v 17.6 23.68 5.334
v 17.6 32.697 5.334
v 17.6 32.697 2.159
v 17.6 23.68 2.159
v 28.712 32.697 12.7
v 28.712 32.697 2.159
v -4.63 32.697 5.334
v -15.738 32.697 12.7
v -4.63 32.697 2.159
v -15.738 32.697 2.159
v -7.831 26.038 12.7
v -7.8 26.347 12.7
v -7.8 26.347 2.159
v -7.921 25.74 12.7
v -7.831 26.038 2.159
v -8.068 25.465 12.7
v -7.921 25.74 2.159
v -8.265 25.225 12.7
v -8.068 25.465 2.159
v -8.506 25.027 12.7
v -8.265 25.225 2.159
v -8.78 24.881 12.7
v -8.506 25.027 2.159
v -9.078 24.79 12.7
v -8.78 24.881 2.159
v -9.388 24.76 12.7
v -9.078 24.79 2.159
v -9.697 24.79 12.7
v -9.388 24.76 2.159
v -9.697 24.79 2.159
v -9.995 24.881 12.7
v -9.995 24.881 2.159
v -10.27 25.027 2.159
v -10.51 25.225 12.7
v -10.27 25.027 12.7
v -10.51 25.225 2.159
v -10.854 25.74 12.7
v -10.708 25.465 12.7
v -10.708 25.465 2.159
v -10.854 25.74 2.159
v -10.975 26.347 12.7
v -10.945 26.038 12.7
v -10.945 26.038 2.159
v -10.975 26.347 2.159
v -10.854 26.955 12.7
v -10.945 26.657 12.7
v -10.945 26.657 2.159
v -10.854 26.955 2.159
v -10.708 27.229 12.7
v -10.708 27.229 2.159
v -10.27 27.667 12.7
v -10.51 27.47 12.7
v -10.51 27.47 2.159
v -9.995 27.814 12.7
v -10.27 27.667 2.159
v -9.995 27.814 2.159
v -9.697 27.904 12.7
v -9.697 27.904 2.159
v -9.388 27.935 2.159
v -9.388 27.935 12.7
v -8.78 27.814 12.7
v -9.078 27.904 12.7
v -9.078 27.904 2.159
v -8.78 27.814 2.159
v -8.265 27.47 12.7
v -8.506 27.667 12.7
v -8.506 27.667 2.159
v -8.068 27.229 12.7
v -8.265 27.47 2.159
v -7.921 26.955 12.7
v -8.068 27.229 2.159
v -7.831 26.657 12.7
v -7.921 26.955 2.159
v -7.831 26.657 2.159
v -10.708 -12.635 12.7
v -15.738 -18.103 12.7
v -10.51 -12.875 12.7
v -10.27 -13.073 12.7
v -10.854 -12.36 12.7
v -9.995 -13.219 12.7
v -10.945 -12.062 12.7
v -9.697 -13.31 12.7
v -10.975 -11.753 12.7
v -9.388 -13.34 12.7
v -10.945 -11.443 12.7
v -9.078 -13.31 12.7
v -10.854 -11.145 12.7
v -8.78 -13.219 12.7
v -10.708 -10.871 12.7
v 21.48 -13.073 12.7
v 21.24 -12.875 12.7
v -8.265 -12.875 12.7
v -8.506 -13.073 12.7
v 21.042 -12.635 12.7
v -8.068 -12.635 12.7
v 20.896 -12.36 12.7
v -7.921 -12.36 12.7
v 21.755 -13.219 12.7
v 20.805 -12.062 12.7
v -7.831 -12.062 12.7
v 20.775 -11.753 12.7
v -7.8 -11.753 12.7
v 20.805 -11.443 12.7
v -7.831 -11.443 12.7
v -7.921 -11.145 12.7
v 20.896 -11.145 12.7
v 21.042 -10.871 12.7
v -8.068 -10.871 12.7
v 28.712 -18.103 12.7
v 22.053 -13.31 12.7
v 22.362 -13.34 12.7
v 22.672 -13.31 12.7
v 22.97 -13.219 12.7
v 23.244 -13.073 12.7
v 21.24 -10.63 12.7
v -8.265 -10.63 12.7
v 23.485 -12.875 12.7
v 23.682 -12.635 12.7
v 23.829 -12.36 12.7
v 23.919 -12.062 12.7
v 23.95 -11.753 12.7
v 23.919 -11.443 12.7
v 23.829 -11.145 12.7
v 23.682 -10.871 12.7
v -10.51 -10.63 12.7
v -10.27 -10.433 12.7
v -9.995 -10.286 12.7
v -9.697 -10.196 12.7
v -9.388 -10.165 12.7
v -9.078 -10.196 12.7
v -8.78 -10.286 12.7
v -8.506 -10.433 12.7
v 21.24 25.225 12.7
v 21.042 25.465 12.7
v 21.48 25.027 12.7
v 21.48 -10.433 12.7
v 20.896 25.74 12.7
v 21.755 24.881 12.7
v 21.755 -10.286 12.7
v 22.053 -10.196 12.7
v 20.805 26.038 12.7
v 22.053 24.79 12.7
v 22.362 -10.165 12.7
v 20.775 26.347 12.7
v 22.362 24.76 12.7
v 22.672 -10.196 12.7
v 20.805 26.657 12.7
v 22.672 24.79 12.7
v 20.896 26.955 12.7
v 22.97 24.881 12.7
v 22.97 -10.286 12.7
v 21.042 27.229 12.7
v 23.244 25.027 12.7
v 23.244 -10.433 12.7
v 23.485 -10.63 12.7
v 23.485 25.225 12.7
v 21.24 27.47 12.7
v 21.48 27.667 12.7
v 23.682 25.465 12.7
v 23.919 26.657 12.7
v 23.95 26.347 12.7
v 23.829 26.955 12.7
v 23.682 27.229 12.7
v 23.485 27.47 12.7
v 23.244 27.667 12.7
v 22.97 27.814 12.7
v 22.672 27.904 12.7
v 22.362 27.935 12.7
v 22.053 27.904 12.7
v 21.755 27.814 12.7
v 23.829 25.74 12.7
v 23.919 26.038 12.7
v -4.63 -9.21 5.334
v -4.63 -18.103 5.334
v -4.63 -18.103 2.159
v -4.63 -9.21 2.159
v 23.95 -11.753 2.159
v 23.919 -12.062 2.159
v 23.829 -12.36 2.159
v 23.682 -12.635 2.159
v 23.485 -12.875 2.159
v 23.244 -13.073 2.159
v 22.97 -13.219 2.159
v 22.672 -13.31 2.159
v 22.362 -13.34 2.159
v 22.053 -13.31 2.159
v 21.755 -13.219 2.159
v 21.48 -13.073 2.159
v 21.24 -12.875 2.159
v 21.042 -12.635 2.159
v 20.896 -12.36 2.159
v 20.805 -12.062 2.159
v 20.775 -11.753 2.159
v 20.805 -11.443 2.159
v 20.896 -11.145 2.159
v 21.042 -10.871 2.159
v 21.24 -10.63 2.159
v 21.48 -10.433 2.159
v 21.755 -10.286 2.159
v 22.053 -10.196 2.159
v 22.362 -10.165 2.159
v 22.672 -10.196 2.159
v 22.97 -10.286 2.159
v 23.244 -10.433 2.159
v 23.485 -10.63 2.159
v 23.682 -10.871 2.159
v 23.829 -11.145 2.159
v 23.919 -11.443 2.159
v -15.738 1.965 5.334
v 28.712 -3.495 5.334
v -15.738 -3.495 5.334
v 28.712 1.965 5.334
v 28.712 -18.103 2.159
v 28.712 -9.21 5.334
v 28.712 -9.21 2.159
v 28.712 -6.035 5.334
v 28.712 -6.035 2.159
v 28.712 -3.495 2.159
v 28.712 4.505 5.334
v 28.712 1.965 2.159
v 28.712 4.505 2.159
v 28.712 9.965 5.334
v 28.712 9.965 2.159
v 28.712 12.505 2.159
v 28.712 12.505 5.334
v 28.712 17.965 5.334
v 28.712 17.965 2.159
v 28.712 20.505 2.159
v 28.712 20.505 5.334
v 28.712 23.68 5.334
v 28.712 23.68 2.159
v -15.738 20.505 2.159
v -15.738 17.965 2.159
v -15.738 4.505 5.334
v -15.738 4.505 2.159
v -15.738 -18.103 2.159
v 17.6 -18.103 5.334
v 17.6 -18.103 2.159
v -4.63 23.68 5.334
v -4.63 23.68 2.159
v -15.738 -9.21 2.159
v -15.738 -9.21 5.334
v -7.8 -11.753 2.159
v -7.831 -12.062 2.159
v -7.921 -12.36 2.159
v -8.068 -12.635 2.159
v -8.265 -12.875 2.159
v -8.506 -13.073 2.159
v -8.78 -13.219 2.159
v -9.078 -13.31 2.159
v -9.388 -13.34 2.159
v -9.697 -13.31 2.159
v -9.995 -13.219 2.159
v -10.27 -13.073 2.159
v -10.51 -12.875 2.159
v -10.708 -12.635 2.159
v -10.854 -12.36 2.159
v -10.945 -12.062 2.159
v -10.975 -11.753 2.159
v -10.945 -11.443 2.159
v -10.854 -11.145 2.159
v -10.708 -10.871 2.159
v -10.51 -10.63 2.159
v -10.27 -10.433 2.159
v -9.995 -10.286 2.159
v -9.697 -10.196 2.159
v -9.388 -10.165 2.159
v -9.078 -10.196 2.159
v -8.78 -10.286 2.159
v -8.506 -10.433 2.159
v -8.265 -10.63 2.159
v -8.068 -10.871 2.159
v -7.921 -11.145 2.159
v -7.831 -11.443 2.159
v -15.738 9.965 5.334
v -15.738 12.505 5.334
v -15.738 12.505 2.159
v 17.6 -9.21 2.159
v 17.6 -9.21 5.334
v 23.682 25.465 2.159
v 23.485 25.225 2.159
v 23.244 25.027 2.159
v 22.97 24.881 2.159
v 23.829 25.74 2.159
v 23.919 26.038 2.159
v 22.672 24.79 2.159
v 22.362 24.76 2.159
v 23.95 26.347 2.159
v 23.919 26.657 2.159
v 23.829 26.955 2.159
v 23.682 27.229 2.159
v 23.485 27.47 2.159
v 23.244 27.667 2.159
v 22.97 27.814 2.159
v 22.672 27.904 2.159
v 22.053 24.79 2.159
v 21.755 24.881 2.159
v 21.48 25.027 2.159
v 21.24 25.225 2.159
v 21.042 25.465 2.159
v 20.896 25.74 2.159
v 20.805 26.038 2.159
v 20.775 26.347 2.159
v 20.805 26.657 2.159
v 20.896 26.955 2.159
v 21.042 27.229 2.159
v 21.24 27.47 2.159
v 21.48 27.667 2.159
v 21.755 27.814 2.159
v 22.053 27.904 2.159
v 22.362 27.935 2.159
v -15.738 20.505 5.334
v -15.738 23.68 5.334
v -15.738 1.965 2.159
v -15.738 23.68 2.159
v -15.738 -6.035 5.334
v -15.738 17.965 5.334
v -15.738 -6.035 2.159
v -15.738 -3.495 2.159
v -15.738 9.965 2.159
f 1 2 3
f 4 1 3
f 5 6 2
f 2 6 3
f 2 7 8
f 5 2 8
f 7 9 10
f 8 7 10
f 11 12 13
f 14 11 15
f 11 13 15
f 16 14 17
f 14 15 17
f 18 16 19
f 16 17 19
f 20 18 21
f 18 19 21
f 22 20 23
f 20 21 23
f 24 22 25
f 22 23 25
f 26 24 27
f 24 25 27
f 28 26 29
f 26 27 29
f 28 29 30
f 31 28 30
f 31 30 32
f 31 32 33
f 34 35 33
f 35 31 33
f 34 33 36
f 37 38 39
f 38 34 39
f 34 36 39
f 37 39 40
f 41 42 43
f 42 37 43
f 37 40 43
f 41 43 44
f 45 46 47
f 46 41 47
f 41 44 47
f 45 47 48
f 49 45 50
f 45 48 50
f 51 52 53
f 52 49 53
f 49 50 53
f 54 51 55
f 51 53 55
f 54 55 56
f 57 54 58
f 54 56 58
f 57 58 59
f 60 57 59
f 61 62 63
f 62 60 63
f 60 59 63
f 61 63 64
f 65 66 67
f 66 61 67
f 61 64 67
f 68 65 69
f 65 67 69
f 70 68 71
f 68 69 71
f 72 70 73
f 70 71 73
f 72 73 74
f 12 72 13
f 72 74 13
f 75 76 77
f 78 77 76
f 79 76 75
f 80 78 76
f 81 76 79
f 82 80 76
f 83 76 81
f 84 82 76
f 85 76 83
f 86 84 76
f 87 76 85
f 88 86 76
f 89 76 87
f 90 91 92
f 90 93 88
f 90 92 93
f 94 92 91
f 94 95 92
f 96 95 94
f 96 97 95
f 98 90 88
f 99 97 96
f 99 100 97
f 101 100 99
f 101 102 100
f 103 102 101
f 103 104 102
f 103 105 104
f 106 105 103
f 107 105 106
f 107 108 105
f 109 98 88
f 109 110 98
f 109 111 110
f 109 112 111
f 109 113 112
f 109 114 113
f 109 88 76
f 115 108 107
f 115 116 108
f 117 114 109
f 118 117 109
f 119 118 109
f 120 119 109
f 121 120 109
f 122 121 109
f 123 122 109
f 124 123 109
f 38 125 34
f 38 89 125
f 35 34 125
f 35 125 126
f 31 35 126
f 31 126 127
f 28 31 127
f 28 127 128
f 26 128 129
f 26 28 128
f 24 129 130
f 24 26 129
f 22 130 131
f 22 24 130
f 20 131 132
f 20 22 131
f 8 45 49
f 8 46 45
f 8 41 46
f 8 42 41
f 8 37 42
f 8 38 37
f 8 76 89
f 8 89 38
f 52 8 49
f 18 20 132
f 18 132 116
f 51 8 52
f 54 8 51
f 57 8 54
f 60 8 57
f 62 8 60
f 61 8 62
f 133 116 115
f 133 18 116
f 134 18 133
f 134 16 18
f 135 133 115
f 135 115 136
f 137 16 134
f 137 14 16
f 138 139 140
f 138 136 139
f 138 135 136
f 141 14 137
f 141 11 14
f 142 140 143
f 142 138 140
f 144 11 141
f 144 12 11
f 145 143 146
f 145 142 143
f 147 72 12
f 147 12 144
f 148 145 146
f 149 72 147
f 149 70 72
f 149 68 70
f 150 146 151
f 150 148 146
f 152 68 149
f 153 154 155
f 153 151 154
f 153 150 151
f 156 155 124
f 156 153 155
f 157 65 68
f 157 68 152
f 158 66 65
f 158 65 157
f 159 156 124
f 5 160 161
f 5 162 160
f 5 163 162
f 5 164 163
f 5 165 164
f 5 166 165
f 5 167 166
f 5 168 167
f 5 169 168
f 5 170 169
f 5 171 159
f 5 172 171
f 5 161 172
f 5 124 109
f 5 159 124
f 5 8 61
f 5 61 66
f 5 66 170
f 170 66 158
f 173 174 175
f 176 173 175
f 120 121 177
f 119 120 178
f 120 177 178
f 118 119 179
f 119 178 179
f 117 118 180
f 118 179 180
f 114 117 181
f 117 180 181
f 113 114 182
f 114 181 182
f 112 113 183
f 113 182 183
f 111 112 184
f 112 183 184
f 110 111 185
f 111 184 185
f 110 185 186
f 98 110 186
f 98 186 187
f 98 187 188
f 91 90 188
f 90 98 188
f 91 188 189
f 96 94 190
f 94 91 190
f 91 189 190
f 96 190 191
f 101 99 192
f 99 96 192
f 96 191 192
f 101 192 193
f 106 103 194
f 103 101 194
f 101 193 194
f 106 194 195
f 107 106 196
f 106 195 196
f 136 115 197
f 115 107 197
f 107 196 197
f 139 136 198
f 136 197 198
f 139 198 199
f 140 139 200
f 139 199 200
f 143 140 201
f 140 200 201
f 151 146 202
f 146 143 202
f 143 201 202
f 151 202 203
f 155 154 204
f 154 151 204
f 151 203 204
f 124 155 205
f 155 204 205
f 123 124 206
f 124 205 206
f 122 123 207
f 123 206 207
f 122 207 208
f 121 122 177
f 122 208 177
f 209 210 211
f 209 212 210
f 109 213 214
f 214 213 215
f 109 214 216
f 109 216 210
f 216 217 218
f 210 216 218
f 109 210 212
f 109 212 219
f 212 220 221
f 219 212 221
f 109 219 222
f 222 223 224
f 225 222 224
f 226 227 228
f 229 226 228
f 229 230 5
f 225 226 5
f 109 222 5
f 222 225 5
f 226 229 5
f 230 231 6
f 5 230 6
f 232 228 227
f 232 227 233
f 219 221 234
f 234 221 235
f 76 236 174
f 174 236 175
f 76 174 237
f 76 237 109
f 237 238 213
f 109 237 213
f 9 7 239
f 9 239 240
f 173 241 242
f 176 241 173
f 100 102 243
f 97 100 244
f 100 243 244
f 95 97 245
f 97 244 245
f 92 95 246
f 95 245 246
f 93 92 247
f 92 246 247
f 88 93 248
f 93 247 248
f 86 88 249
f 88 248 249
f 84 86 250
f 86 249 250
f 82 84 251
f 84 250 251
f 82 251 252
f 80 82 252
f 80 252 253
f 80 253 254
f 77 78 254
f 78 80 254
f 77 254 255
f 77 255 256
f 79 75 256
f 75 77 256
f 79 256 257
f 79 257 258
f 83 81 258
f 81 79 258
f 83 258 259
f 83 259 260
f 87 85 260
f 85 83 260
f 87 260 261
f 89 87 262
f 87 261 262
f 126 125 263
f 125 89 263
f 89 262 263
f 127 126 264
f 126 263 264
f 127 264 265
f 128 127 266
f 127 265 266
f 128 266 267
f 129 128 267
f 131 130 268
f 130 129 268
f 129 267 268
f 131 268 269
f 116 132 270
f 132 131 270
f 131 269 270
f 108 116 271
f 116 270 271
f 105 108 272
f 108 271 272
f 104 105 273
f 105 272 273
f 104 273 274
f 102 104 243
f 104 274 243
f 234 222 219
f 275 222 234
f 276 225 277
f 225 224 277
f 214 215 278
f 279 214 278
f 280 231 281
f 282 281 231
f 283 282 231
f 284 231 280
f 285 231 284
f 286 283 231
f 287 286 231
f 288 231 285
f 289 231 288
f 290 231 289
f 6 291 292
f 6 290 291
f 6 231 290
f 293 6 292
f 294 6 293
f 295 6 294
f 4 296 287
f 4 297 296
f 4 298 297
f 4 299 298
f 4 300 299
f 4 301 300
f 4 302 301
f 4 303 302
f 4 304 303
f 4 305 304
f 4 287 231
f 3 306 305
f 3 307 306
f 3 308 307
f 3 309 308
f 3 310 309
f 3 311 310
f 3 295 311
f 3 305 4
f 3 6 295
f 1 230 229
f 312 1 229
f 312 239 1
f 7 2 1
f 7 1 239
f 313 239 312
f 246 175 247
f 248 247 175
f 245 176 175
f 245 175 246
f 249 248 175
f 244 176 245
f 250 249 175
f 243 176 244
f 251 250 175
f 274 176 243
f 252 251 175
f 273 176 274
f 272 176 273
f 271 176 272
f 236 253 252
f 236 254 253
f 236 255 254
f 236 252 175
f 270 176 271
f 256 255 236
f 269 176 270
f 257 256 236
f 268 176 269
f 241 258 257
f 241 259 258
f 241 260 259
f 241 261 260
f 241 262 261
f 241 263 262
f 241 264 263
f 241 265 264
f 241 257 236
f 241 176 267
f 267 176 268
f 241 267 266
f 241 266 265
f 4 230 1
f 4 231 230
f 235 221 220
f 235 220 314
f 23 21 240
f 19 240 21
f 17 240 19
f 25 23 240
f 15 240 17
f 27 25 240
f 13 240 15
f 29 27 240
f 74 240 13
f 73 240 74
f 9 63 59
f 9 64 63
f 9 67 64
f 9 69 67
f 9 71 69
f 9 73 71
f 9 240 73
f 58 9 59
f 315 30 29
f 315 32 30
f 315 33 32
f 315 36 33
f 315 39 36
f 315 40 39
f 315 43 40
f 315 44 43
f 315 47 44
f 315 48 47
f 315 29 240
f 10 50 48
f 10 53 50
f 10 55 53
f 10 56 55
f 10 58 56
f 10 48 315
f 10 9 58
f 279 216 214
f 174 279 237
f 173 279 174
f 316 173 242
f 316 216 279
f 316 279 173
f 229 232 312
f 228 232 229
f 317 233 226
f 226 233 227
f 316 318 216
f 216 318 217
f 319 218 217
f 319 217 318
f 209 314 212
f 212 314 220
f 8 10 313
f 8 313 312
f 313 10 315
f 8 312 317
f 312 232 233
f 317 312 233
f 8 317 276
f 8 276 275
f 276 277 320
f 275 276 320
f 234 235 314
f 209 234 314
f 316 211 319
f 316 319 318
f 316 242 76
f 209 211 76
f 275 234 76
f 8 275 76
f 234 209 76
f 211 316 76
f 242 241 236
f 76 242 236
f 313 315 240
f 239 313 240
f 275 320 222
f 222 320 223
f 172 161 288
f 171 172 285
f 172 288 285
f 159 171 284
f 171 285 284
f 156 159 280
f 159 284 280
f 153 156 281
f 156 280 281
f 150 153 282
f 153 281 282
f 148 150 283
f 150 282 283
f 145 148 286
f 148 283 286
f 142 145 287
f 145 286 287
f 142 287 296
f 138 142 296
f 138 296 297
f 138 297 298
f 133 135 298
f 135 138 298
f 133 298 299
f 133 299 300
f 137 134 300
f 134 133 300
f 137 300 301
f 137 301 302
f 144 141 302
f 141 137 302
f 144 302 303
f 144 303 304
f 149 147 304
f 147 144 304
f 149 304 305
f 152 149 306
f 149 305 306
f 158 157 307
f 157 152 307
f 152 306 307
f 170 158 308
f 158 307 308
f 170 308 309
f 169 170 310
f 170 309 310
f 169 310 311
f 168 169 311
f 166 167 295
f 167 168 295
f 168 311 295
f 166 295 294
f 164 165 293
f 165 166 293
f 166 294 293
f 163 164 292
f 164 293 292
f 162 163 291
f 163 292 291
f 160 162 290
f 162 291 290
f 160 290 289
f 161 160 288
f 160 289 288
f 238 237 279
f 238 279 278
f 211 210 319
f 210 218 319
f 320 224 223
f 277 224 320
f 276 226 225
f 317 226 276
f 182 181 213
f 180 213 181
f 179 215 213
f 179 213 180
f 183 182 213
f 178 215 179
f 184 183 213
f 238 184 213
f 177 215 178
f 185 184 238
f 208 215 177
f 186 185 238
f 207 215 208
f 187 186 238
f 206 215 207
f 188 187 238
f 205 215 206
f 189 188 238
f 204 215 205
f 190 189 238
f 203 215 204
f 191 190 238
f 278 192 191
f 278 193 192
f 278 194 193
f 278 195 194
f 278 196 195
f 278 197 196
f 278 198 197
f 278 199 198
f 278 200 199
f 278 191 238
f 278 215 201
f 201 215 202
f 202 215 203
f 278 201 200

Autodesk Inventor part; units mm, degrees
ref_plane "YZ Plane" through (0, 0, 0) normal (1, 0, 0) x (0, 1, 0)
ref_plane "XZ Plane" through (0, 0, 0) normal (0, 1, 0) x (-1, 0, 0)
sketch "Sketch1" plane through (0, 0, 0) normal (0, 0, 1) x (1, 0, 0)
  circle A0 centre (22.3624, 26.3473) radius 1.5875
  circle A1 centre (22.3624, -11.7527) radius 1.5875
  circle A2 centre (-9.3876, 26.3473) radius 1.5875
  circle A3 centre (-9.3876, -11.7527) radius 1.5875
  line L0 (28.7124, 32.6973) -> (-15.7376, 32.6973)
  line L1 (-15.7376, 32.6973) -> (-15.7376, -18.1027)
  line L2 (-15.7376, -18.1027) -> (28.7124, -18.1027)
  line L3 (28.7124, -18.1027) -> (28.7124, 32.6973)
  point P0 (-3.5123, 7.2973)
  dimension "d26" = 50.8
  dimension "d27" = 44.45
  dimension "d28" = 6.35
  dimension "d29" = 6.35
  dimension "d30" = 6.35
  dimension "d31" = 6.35
  dimension "d32" = 6.35
  dimension "d33" = 6.35
  dimension "d34" = 6.35
  dimension "d35" = 6.35
  dimension "d44" = 3.175
  dimension "d45" = 3.175
  dimension "d46" = 3.175
  dimension "d47" = 3.175
extrude "Extrusion1" add sketch "Sketch1" along normal blind 12.7
sketch "Sketch2" plane through (-15.7376, -18.1027, 0) normal (0, -1, 0) x (1, 0, 0)
  line L0 (11.1075, 69.4178) -> (11.1075, 0)
  line L1 (33.3375, 69.1638) -> (33.3375, 0)
  line L2 (11.1075, 0) -> (33.3375, 0)
  line L3 (0, 9.525) -> (44.45, 9.525)
  line L4 (11.1075, 0) -> (33.3375, 0)
  line L5 (33.3375, 0) -> (33.3375, 5.334)
  line L6 (33.3375, 5.334) -> (11.1075, 5.334)
  line L7 (11.1075, 5.334) -> (11.1075, 0)
  line L8 (0, 0) -> (44.45, 0) projected
  point P0 (15.875, 0)
  point P1 (11.1075, 5.334)
  dimension "d2" = 5.334
  dimension "d21" = 0
extrude "Extrusion2" cut sketch "Sketch2" against normal blind 76.2 contours L6 L1 L2 L0
ref_plane "Work Plane1" through (-16.0653, -32.8267, -33.655) normal (0, 0, -1) x (0, 1, 0)
sketch "Sketch3" plane through (17.5999, -18.1027, 5.334) normal (0, 0, -1) x (-1, 0, 0)
  line L0 (0, 0) -> (0, 50.8) projected
  line L1 (0, 36.068) -> (22.23, 36.068)
  line L2 (22.23, 36.068) -> (22.23, 38.608)
  line L3 (22.23, 38.608) -> (0, 38.608)
  line L4 (0, 38.608) -> (0, 36.068)
  line L5 (0, 50.8) -> (22.23, 50.8) projected
  line L6 (33.3375, 65.3946) -> (33.3375, 0) projected
  line L7 (0, 28.068) -> (22.23, 28.068)
  line L8 (22.23, 28.068) -> (22.23, 30.608)
  line L9 (22.23, 30.608) -> (0, 30.608)
  line L10 (0, 30.608) -> (0, 28.068)
  line L11 (0, 20.068) -> (22.23, 20.068)
  line L12 (22.23, 20.068) -> (22.23, 22.608)
  line L13 (22.23, 22.608) -> (0, 22.608)
  line L14 (0, 22.608) -> (0, 20.068)
  line L15 (0, 12.068) -> (22.23, 12.068)
  line L16 (22.23, 12.068) -> (22.23, 14.608)
  line L17 (22.23, 14.608) -> (0, 14.608)
  line L18 (0, 14.608) -> (0, 12.068)
  point P0 (17.5999, 18.1027)
  point P1 (0, 14.608)
  point P2 (0, 12.068)
  point P3 (0, 22.608)
  point P4 (0, 20.068)
  point P5 (0, 30.608)
  point P6 (0, 28.068)
  point P7 (0, 38.608)
  dimension "d6" = 12.192
  dimension "d7" = 2.54
  dimension "d10" = 8
extrude "Extrusion3" add sketch "Sketch3" along normal blind 5.334
sketch "Sketch4" plane through (0, 0, 0) normal (0, 0, -1) x (-1, 0, 0)
  line L0 (-17.5999, 12.5053) -> (4.6301, 12.5053) projected
  line L1 (4.6301, 12.5053) -> (4.6301, 17.9653)
  line L2 (4.6301, 17.9653) -> (-17.5999, 17.9653) projected
  line L3 (-17.5999, 12.5053) -> (-17.5999, 17.9653)
  line L4 (-17.5999, 4.5053) -> (4.6301, 4.5053) projected
  line L5 (4.6301, 4.5053) -> (4.6301, 9.9653)
  line L6 (4.6301, 9.9653) -> (-17.5999, 9.9653) projected
  line L7 (-17.5999, 4.5053) -> (-17.5999, 9.9653)
  line L8 (4.6301, 1.9653) -> (-17.5999, 1.9653) projected
  line L9 (-17.5999, -3.4947) -> (-17.5999, 1.9653)
  line L10 (-17.5999, -3.4947) -> (4.6301, -3.4947) projected
  line L11 (4.6301, -3.4947) -> (4.6301, 1.9653)
  line L12 (4.6301, 20.5053) -> (4.6301, 32.6973) projected
  line L13 (4.6301, 20.5053) -> (20.4326, 20.5053)
  line L14 (20.4326, 20.5053) -> (20.4326, 23.6803)
  line L15 (20.4326, 23.6803) -> (4.6301, 23.6803)
  line L16 (4.6301, 23.6803) -> (4.6301, 20.5053)
  line L17 (4.6301, -6.0347) -> (-17.5999, -6.0347) projected
  line L18 (4.6301, -6.0347) -> (18.5436, -6.0347)
  line L19 (18.5436, -6.0347) -> (18.5436, -9.2097)
  line L20 (18.5436, -9.2097) -> (4.6301, -9.2097)
  line L21 (4.6301, -9.2097) -> (4.6301, -6.0347)
  line L22 (4.6301, 12.5053) -> (4.6301, 17.9653) projected
  line L23 (4.6301, 17.9653) -> (23.203, 17.9653)
  line L24 (23.203, 17.9653) -> (23.203, 12.5053)
  line L25 (23.203, 12.5053) -> (4.6301, 12.5053)
  line L26 (4.6301, 12.5053) -> (4.6301, 17.9653)
  line L27 (4.6301, 9.9653) -> (4.6301, 4.5053) projected
  line L28 (4.6301, 9.9653) -> (22.3845, 9.9653)
  line L29 (22.3845, 9.9653) -> (22.3845, 4.5053)
  line L30 (22.3845, 4.5053) -> (4.6301, 4.5053)
  line L31 (4.6301, 4.5053) -> (4.6301, 9.9653)
  line L32 (4.6301, 1.9653) -> (4.6301, -3.4947) projected
  line L33 (4.6301, 1.9653) -> (21.9437, 1.9653)
  line L34 (21.9437, 1.9653) -> (21.9437, -3.4947)
  line L35 (21.9437, -3.4947) -> (4.6301, -3.4947)
  line L36 (4.6301, -3.4947) -> (4.6301, 1.9653)
  line L37 (-17.5999, 17.9653) -> (-33.0876, 17.9653)
  line L38 (-33.0876, 17.9653) -> (-33.0876, 12.5053)
  line L39 (-33.0876, 12.5053) -> (-17.5999, 12.5053)
  line L40 (-17.5999, 12.5053) -> (-17.5999, 17.9653)
  line L41 (-17.5999, 9.9653) -> (-34.7876, 9.9653)
  line L42 (-34.7876, 9.9653) -> (-34.7876, 4.5053)
  line L43 (-34.7876, 4.5053) -> (-17.5999, 4.5053)
  line L44 (-17.5999, 4.5053) -> (-17.5999, 9.9653)
  line L45 (-17.5999, 1.9653) -> (4.6301, 1.9653) projected
  line L46 (-17.5999, 1.9653) -> (-33.0876, 1.9653)
  line L47 (-33.0876, 1.9653) -> (-33.0876, -3.4947)
  line L48 (-33.0876, -3.4947) -> (-17.5999, -3.4947)
  line L49 (-17.5999, -3.4947) -> (-17.5999, 1.9653)
  line L50 (-17.5999, 20.5053) -> (-30.1912, 20.5053)
  line L51 (-30.1912, 20.5053) -> (-30.1912, 23.6803)
  line L52 (-30.1912, 23.6803) -> (-17.5999, 23.6803)
  line L53 (-17.5999, 23.6803) -> (-17.5999, 20.5053)
  line L54 (-17.5999, -6.0347) -> (-30.1912, -6.0347)
  line L55 (-30.1912, -6.0347) -> (-30.1912, -9.2097)
  line L56 (-30.1912, -9.2097) -> (-17.5999, -9.2097)
  line L57 (-17.5999, -9.2097) -> (-17.5999, -6.0347)
  point P0 (-17.5999, -3.4947)
  point P1 (4.6301, -3.4947)
  point P2 (-17.5999, 4.5053)
  point P3 (4.6301, 4.5053)
  point P4 (-17.5999, 12.5053)
  point P5 (4.6301, 12.5053)
  point P6 (4.6301, 23.6803)
  dimension "d40" = 3.175
  dimension "d41" = 3.175
  dimension "d42" = 3.175
  dimension "d43" = 3.175
extrude "Extrusion4" cut sketch "Sketch4" against normal blind 5.334 contours L39 L38 L37 L3 | L1 L23 L24 L25 | L43 L42 L41 L7 | L5 L28 L29 L30 | L33 L34 L35 L11 | L9 L48 L47 L46 | L12 L15 L14 L13 | L57 L56 L55 L54 | L18 L19 L20 L21 | L50 L51 L52 L53
sketch "Sketch5" plane through (0, 0, 0) normal (0, 0, -1) x (-1, 0, 0)
  line L0 (17.6982, 39.5282) -> (-30.6897, 39.5282)
  line L1 (-30.6897, 39.5282) -> (-30.6897, -19.7169)
  line L2 (-30.6897, -19.7169) -> (17.6982, -19.7169)
  line L3 (17.6982, -19.7169) -> (17.6982, 39.5282)
extrude "Extrusion5" cut sketch "Sketch5" against normal blind 2.159
properties part number "Belt Clamp"
